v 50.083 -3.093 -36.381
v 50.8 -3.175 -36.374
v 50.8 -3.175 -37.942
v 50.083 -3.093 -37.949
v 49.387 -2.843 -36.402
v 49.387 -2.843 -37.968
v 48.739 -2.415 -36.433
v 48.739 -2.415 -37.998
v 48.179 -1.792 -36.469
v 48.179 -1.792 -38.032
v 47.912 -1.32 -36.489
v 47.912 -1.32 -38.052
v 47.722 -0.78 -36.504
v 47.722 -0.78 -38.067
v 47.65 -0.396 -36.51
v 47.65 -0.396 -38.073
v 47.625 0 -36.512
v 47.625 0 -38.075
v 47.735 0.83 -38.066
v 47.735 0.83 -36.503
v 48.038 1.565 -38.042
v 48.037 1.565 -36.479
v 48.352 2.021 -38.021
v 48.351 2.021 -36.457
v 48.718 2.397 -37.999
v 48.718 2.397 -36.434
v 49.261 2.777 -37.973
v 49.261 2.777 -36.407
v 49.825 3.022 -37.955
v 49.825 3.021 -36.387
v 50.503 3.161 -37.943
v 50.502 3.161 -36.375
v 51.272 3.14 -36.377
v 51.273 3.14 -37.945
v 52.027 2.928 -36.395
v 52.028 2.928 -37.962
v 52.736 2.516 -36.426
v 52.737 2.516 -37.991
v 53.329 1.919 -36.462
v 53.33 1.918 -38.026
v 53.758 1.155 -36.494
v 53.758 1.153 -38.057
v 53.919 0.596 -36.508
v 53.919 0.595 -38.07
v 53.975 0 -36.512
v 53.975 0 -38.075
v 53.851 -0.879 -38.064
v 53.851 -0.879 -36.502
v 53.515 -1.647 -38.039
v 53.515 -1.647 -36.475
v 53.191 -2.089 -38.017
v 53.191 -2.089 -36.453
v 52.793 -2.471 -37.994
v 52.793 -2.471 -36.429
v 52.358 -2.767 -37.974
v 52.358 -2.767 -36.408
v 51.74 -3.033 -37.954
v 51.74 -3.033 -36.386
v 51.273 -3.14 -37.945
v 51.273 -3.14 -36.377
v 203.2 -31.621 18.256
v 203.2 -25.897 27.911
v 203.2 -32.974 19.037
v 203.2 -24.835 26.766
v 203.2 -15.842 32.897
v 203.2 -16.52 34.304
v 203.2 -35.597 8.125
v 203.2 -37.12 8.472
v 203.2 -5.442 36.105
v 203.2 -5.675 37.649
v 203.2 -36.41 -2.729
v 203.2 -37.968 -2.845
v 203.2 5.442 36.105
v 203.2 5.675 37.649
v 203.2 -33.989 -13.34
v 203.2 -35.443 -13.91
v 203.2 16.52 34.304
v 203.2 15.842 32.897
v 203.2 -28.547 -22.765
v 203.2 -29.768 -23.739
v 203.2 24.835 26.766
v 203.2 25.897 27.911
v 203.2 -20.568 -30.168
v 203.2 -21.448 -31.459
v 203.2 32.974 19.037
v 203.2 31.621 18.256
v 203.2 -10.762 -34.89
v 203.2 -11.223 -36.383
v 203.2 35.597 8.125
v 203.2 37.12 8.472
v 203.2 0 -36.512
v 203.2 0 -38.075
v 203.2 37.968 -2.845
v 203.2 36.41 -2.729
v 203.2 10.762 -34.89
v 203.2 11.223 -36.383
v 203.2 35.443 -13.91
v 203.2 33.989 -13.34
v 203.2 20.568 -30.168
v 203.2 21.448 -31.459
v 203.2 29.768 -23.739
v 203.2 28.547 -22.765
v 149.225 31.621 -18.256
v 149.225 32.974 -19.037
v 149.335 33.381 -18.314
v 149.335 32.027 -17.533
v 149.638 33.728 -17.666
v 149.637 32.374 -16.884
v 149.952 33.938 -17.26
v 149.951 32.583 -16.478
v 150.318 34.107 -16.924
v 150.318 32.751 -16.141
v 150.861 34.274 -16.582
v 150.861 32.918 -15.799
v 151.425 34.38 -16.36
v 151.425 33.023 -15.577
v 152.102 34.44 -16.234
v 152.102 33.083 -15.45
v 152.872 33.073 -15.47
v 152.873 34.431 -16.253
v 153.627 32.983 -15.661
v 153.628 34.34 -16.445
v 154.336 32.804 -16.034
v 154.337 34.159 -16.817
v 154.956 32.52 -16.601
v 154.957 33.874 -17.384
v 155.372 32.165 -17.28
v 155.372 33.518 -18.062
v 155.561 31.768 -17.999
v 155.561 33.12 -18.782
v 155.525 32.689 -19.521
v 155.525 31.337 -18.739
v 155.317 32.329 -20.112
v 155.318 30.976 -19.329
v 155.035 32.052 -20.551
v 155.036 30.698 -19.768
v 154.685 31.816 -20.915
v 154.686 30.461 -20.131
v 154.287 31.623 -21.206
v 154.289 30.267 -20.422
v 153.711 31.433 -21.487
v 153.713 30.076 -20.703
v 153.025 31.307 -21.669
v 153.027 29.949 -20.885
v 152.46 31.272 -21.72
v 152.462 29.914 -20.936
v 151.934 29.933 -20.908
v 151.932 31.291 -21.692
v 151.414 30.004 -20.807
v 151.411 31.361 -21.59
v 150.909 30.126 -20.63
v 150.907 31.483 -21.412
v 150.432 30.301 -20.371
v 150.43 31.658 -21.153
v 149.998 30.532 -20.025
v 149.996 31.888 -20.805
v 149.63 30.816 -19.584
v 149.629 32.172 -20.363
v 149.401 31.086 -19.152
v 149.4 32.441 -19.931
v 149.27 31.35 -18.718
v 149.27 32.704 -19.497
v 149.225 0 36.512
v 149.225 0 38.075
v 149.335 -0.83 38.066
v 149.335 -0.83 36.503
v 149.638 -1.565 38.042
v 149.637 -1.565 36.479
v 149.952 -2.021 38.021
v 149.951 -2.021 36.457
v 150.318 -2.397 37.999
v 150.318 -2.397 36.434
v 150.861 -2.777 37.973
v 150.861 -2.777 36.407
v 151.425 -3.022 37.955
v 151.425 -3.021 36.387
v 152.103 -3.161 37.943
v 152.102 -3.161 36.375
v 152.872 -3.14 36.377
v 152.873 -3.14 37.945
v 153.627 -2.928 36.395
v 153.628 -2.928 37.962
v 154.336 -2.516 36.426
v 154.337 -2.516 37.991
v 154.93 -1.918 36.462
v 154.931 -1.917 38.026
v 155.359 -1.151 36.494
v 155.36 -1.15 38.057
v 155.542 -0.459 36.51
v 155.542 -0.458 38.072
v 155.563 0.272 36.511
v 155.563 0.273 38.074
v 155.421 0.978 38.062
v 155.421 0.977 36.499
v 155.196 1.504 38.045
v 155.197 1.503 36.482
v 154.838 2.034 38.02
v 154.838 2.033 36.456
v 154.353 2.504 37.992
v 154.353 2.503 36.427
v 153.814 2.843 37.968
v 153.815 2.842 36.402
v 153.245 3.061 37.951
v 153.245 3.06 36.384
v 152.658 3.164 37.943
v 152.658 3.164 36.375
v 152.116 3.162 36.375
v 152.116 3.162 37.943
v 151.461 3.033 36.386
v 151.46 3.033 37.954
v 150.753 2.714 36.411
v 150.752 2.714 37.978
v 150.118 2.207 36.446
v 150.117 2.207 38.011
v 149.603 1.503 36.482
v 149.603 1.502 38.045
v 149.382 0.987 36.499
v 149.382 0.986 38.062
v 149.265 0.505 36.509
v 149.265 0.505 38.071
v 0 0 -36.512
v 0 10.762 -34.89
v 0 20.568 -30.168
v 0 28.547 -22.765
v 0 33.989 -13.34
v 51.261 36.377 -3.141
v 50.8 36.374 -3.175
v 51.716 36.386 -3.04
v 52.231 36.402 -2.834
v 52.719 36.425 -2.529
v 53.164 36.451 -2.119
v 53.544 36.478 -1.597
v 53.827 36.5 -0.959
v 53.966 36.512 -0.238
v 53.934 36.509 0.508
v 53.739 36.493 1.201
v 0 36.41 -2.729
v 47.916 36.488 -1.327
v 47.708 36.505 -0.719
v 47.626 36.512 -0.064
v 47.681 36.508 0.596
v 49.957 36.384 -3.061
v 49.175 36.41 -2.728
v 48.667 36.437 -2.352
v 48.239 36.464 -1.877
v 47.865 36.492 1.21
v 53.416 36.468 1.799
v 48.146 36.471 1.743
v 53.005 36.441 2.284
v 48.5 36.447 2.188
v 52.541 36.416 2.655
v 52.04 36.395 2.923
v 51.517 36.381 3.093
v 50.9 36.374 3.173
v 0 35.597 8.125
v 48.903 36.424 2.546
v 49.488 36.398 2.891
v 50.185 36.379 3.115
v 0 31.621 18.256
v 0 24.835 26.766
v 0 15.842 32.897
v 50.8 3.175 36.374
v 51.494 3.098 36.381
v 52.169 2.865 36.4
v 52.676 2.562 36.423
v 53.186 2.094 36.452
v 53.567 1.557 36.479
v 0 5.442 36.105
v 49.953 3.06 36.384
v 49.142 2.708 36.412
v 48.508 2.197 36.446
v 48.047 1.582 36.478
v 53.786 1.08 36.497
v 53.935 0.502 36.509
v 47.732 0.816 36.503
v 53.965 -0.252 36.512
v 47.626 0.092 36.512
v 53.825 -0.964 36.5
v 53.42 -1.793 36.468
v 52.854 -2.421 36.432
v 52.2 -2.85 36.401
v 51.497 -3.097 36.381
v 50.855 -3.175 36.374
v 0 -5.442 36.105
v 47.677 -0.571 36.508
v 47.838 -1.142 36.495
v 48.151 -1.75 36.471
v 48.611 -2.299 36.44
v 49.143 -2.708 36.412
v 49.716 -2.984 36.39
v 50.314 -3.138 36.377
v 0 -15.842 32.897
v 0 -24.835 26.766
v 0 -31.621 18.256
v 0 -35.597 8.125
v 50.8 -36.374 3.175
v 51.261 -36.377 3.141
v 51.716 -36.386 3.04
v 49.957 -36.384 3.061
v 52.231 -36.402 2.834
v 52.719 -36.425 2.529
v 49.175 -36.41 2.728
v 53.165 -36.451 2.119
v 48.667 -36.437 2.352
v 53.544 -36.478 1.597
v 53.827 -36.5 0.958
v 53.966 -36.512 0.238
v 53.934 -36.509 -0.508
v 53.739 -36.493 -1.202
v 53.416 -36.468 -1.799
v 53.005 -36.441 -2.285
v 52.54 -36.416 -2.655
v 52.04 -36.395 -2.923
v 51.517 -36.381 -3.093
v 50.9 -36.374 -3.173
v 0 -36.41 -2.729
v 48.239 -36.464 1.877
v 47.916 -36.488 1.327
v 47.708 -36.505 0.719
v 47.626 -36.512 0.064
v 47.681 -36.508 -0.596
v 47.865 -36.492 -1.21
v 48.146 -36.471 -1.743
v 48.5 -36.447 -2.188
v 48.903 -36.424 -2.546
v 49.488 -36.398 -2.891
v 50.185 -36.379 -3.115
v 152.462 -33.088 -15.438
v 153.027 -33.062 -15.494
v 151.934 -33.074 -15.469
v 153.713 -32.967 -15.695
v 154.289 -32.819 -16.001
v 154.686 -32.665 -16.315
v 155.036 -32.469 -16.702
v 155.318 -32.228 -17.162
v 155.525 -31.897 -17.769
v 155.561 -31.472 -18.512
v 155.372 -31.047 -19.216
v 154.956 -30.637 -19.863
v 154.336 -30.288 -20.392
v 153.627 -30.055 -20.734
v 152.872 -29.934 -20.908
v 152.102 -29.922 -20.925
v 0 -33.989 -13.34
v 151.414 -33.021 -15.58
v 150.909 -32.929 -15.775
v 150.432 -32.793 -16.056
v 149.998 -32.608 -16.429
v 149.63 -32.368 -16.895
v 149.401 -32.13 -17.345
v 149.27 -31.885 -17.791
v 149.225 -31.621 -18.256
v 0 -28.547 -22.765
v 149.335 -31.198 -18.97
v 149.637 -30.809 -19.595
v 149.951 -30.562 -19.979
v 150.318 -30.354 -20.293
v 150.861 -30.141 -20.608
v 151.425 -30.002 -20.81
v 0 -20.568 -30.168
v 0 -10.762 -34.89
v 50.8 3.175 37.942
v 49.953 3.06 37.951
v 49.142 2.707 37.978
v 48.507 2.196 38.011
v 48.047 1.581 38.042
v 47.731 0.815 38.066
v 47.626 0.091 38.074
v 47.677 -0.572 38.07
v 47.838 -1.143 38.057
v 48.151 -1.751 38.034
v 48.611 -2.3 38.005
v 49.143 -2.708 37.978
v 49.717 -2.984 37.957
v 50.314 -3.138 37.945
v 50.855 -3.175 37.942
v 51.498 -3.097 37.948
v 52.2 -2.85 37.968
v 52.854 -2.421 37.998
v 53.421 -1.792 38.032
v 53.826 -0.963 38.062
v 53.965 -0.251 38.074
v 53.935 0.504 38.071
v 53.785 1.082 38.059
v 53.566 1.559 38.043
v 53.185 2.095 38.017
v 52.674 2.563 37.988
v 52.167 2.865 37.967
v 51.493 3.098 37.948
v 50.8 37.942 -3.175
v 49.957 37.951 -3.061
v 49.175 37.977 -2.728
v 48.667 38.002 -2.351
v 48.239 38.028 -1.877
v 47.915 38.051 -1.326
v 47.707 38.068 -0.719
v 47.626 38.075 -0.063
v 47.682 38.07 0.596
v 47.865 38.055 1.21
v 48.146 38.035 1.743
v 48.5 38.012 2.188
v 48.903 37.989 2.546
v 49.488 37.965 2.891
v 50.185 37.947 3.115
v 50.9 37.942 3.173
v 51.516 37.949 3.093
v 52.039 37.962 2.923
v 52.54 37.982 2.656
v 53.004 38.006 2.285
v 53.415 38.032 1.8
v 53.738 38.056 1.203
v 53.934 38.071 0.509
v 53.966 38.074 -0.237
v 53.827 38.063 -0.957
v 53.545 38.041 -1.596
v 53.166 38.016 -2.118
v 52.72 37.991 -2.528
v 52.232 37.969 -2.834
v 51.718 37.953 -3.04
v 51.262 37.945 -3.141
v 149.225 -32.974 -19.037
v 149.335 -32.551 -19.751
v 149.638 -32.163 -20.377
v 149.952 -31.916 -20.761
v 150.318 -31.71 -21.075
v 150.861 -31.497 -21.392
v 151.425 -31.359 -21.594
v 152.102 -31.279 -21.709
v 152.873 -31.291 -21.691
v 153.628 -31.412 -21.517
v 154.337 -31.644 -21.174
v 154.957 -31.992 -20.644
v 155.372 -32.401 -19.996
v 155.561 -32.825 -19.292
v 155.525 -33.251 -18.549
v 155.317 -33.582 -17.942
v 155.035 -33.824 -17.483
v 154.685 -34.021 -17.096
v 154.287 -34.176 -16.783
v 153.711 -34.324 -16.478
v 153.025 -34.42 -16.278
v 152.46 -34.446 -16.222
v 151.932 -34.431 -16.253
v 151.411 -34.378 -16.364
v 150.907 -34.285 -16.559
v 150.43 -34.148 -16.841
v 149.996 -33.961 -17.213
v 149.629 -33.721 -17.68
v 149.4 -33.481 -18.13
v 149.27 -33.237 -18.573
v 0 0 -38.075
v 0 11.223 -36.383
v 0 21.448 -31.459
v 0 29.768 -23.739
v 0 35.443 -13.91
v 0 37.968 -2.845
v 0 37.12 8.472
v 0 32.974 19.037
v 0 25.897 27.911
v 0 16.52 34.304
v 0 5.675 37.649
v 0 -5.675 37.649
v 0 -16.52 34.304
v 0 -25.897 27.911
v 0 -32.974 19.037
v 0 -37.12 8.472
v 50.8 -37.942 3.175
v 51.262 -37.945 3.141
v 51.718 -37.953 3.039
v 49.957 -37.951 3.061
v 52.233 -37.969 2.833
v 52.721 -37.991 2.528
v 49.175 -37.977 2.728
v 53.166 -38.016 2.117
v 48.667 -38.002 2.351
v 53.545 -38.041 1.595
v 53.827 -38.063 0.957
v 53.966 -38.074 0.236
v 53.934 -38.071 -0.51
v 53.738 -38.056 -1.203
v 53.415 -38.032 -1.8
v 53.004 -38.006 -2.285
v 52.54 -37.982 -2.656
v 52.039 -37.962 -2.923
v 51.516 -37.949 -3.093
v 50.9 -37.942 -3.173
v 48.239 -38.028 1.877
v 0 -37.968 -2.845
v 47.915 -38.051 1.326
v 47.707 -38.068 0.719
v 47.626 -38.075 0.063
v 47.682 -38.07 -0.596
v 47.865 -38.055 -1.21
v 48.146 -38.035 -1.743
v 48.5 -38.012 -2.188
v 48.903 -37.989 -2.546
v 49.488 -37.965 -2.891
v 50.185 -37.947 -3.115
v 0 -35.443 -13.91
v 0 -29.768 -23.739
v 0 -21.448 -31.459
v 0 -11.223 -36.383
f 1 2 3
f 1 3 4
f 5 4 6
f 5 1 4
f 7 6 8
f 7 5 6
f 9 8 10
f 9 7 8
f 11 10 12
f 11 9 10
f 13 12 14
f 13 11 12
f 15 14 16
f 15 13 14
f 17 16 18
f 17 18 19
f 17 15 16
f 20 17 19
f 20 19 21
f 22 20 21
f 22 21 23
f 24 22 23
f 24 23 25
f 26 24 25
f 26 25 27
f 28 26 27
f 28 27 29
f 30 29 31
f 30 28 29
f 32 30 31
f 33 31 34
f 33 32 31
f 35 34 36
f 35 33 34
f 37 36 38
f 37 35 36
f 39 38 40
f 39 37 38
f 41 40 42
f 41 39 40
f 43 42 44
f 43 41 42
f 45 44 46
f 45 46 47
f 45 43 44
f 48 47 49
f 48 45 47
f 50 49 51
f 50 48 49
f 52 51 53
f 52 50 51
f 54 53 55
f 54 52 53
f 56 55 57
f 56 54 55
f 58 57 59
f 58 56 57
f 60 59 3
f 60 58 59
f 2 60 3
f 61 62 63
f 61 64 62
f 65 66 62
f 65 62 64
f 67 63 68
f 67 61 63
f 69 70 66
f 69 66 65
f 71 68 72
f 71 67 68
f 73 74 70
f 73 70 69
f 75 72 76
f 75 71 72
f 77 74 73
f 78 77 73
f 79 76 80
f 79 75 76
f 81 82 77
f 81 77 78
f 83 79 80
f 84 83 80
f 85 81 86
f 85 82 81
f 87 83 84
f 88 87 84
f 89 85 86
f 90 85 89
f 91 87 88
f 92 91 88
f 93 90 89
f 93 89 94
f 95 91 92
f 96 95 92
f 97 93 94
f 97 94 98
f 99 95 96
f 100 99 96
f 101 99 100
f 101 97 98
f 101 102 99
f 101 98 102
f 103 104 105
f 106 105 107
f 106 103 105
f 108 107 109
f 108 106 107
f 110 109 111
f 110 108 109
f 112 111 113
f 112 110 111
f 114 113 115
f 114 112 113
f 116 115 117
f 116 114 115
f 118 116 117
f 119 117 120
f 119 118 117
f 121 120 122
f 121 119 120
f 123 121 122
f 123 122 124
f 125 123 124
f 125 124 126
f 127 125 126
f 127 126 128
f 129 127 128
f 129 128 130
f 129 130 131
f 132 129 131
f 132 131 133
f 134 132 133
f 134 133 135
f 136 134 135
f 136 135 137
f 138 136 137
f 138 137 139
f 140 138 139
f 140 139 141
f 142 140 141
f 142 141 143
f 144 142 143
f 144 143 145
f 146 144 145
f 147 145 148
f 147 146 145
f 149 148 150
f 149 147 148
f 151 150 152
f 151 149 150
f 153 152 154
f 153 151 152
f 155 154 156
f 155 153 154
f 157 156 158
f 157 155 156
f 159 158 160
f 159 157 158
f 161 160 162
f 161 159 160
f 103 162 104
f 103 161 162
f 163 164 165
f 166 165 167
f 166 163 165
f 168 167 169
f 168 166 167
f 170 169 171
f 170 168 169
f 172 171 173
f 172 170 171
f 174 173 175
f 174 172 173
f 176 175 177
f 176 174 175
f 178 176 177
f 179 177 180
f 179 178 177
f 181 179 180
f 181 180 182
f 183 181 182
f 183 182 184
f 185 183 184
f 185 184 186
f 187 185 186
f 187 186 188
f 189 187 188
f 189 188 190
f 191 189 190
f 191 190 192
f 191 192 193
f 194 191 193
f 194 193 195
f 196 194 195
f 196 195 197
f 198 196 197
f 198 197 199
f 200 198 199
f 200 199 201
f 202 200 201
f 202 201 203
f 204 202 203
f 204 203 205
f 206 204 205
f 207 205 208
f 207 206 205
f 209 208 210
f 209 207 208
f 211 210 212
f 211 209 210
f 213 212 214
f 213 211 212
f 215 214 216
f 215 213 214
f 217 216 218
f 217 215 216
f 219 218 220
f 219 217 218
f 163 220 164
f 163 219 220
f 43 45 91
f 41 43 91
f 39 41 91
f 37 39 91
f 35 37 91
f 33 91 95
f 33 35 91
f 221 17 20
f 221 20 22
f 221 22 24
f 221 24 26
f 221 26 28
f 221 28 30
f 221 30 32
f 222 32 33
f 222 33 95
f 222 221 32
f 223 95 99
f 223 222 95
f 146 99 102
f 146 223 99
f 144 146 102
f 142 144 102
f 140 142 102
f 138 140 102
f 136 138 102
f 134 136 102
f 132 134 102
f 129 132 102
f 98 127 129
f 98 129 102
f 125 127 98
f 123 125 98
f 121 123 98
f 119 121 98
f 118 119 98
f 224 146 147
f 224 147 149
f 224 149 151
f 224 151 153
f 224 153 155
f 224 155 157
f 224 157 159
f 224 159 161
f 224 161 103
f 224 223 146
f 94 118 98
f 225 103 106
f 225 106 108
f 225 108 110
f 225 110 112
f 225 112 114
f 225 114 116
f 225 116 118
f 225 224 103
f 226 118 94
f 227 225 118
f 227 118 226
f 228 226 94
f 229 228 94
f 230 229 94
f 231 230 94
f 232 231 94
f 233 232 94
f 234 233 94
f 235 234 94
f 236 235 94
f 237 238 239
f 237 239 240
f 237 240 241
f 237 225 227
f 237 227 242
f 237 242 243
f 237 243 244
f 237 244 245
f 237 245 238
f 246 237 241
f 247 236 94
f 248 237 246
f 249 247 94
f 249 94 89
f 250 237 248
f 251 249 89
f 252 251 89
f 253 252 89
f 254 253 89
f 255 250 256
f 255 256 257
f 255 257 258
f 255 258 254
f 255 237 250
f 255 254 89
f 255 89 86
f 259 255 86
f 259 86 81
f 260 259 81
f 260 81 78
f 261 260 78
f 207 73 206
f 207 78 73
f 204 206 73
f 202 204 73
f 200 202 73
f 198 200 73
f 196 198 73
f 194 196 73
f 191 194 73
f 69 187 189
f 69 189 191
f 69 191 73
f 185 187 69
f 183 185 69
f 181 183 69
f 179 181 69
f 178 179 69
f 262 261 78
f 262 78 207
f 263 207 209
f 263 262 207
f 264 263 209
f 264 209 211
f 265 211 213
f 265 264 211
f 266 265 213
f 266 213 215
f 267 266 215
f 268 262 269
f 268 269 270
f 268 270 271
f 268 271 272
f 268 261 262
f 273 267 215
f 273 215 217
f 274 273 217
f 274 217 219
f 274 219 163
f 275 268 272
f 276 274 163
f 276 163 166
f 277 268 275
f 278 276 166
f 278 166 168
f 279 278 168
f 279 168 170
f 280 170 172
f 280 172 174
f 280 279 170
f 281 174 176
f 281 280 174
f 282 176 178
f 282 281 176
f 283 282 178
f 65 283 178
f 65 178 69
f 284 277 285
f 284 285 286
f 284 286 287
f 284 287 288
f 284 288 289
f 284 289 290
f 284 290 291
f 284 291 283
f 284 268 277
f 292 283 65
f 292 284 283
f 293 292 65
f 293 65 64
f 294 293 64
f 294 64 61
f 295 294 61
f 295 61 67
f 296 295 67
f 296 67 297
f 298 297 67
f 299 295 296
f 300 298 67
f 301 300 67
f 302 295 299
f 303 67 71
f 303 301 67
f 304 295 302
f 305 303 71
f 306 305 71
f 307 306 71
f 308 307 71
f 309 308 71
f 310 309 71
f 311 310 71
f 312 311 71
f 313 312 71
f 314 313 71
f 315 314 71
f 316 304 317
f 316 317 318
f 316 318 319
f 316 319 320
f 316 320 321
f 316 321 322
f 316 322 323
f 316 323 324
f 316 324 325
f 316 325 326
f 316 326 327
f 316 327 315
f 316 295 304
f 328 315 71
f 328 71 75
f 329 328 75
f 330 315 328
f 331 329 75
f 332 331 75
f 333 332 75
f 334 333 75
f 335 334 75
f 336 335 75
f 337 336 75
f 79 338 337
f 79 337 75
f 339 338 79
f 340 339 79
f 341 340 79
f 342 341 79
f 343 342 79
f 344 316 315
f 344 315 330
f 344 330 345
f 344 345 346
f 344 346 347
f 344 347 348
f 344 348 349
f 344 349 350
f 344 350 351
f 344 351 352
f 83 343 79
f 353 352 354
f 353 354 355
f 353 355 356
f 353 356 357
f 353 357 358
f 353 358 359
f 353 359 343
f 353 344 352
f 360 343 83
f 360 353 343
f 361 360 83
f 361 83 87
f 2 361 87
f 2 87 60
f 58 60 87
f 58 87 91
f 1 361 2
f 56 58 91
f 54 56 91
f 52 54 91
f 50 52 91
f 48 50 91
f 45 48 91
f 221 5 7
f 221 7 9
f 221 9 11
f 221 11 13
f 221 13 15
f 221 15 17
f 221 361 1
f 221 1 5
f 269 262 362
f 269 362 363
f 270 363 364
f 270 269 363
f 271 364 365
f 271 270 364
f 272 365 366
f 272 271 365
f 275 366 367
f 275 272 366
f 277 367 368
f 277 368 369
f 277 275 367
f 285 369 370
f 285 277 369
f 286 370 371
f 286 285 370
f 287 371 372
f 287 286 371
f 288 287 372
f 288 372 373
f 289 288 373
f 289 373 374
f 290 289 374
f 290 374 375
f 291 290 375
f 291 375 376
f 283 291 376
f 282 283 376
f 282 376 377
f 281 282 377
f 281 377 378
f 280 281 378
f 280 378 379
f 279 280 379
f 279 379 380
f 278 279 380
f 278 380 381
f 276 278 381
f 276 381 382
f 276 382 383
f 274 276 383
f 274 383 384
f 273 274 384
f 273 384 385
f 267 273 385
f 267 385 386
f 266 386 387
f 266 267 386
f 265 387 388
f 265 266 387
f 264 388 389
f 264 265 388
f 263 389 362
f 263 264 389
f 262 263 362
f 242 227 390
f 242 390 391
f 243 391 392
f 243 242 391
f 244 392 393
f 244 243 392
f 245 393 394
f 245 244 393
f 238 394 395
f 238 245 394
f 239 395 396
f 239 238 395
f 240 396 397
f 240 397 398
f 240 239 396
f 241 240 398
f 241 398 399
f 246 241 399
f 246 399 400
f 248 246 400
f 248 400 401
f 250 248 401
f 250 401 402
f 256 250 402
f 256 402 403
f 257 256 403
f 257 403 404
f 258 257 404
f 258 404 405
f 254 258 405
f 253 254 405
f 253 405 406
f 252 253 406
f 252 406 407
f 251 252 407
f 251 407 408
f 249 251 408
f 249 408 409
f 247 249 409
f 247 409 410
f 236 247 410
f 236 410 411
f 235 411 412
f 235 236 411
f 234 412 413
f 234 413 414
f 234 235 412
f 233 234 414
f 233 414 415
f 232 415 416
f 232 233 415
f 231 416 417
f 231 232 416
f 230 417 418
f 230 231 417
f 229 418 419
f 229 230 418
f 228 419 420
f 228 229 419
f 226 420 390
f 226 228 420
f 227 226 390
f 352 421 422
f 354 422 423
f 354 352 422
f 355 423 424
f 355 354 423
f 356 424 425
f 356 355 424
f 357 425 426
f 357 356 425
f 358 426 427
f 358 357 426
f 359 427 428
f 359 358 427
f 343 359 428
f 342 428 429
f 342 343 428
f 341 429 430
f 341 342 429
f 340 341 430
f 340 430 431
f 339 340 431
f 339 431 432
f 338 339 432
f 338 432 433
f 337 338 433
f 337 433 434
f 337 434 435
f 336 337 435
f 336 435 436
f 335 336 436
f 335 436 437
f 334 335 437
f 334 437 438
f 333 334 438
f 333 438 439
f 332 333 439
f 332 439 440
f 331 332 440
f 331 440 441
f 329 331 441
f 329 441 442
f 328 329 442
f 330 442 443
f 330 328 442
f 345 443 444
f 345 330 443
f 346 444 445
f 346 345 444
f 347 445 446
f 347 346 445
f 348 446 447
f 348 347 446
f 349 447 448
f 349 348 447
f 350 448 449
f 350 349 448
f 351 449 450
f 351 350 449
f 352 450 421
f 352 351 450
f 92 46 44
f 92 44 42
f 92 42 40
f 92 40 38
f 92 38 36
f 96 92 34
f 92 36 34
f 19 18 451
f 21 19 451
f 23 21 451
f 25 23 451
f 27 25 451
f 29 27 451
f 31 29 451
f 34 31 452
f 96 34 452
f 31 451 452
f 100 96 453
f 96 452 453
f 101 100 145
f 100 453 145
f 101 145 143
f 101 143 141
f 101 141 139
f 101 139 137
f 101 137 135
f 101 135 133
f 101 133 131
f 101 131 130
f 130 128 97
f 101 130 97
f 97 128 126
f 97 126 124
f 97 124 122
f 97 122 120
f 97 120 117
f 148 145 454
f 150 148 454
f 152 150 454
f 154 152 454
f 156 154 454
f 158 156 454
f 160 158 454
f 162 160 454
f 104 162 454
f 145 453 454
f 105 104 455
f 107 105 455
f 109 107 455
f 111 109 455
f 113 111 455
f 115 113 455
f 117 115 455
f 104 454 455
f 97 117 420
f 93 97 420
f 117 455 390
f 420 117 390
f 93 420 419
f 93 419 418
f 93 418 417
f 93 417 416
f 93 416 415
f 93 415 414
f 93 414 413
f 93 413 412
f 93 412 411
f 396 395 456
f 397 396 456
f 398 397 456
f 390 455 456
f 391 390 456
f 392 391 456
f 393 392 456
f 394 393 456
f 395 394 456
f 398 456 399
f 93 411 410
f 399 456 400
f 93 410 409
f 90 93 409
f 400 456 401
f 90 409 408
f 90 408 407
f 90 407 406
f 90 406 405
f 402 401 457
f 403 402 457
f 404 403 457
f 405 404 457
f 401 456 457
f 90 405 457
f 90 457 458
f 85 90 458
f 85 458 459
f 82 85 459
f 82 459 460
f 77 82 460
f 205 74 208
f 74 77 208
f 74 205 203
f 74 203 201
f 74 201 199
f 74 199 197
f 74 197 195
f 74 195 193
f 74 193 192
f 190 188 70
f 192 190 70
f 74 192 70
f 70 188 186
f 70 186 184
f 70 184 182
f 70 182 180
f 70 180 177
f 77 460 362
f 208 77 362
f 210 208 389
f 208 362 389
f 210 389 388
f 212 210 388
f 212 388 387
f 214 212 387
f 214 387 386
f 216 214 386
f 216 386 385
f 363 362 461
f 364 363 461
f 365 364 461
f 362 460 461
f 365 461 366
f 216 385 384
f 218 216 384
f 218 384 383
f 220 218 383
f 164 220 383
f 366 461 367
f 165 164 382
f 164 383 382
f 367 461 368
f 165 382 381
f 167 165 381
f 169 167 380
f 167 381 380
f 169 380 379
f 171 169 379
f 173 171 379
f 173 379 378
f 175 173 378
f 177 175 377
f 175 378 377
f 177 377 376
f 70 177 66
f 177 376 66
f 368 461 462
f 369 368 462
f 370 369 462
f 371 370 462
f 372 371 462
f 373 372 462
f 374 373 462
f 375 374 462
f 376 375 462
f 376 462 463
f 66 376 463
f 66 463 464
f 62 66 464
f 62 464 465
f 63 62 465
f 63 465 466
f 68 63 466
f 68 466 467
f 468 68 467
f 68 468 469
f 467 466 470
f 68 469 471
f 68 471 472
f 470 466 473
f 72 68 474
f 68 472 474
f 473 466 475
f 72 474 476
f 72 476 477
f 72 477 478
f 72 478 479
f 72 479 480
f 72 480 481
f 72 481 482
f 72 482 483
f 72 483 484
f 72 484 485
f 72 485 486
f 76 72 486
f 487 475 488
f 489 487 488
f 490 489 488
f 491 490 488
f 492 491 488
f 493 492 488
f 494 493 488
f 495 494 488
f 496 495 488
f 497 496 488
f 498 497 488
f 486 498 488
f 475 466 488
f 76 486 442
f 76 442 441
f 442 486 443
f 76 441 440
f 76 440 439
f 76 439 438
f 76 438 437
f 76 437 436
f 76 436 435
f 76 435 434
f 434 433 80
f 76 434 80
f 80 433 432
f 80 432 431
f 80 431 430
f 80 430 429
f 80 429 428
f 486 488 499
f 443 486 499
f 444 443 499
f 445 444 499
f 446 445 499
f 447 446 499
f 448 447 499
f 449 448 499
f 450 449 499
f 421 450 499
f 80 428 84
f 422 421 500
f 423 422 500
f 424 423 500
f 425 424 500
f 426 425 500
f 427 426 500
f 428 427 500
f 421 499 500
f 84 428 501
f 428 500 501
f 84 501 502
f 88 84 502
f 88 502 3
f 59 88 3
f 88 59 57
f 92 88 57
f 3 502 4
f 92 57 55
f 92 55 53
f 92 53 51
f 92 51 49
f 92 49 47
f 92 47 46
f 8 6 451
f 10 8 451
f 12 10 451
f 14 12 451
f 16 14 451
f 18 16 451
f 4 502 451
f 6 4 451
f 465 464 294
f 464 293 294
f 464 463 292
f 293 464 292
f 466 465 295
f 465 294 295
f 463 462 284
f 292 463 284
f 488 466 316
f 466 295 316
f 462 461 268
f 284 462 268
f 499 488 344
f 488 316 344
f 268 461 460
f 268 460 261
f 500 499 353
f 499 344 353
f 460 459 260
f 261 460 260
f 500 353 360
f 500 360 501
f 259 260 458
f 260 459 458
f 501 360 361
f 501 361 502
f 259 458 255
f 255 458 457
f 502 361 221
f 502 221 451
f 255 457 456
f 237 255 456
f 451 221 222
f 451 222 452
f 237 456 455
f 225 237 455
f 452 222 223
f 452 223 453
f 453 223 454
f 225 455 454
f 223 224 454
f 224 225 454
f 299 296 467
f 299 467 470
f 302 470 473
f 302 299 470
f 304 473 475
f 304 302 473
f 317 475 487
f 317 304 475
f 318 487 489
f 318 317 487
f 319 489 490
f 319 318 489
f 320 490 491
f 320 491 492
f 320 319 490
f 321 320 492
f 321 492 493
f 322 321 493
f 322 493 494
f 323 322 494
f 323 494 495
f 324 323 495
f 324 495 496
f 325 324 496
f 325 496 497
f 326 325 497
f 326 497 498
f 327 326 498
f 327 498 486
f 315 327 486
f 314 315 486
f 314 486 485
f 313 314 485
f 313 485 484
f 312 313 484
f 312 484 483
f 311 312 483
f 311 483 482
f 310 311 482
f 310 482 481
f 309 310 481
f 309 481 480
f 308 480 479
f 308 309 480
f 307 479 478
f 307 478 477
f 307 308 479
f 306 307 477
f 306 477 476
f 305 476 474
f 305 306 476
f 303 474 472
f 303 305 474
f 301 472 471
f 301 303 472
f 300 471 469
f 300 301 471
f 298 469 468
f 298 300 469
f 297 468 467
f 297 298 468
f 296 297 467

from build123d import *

# Parameters (mm, degrees)
SKETCH1_R           = 38.0746
SKETCH1_R_2         = 36.5125
BOSS_EXTRUDE1_DEPTH = 203.2
SKETCH2_R           = 3.175
CUT_EXTRUDE1_DEPTH  = 211.213202084
CIRPATTERN1_COUNT   = 4
SKETCH3_R           = 3.175
CUT_EXTRUDE2_DEPTH  = 297.323244266
CIRPATTERN2_COUNT   = 3


with BuildPart() as part:
    # Sketch1 → Boss-Extrude1 (new body)
    with BuildSketch(Plane.YZ):
        with Locations(Location((0, 0, 0), (0, 0, 270))):
            Circle(SKETCH1_R)
        with Locations(Location((0, 0, 0), (0, 0, 270))):
            Circle(SKETCH1_R_2, mode=Mode.SUBTRACT)
    extrude(amount=BOSS_EXTRUDE1_DEPTH)

    # Sketch2 → Cut-Extrude1 (cut, through all)
    with BuildSketch(Plane(origin=(0, 0, 0), x_dir=(-1, 0, 0), z_dir=(0, 1, 0))):
        with Locations(Location((-50.8, 0, 0), (0, 0, 270))):
            Circle(SKETCH2_R)
    cut_extrude1 = extrude(amount=CUT_EXTRUDE1_DEPTH, mode=Mode.SUBTRACT)

    # CirPattern1: Cut-Extrude1 ×4 about axis
    cirpattern1_axis = Axis((203.2, 0, 0), (-1, 0, 0))
    for i in range(1, CIRPATTERN1_COUNT):
        add(cut_extrude1.rotate(cirpattern1_axis, i * 360 / CIRPATTERN1_COUNT), mode=Mode.SUBTRACT)

    # Sketch3 → Cut-Extrude2 (cut, through all)
    with BuildSketch(Plane(origin=(0, 174.216591142, 0), x_dir=(-1, 0, 0), z_dir=(0, 0, 1))):
        with Locations((-152.4, 174.216591142)):
            Circle(SKETCH3_R)
    cut_extrude2 = extrude(amount=CUT_EXTRUDE2_DEPTH, mode=Mode.SUBTRACT)

    # CirPattern2: Cut-Extrude2 ×3 about axis
    cirpattern2_axis = Axis((203.2, 0, 0), (-1, 0, 0))
    for i in range(1, CIRPATTERN2_COUNT):
        add(cut_extrude2.rotate(cirpattern2_axis, i * 360 / CIRPATTERN2_COUNT), mode=Mode.SUBTRACT)


solid = part.part
